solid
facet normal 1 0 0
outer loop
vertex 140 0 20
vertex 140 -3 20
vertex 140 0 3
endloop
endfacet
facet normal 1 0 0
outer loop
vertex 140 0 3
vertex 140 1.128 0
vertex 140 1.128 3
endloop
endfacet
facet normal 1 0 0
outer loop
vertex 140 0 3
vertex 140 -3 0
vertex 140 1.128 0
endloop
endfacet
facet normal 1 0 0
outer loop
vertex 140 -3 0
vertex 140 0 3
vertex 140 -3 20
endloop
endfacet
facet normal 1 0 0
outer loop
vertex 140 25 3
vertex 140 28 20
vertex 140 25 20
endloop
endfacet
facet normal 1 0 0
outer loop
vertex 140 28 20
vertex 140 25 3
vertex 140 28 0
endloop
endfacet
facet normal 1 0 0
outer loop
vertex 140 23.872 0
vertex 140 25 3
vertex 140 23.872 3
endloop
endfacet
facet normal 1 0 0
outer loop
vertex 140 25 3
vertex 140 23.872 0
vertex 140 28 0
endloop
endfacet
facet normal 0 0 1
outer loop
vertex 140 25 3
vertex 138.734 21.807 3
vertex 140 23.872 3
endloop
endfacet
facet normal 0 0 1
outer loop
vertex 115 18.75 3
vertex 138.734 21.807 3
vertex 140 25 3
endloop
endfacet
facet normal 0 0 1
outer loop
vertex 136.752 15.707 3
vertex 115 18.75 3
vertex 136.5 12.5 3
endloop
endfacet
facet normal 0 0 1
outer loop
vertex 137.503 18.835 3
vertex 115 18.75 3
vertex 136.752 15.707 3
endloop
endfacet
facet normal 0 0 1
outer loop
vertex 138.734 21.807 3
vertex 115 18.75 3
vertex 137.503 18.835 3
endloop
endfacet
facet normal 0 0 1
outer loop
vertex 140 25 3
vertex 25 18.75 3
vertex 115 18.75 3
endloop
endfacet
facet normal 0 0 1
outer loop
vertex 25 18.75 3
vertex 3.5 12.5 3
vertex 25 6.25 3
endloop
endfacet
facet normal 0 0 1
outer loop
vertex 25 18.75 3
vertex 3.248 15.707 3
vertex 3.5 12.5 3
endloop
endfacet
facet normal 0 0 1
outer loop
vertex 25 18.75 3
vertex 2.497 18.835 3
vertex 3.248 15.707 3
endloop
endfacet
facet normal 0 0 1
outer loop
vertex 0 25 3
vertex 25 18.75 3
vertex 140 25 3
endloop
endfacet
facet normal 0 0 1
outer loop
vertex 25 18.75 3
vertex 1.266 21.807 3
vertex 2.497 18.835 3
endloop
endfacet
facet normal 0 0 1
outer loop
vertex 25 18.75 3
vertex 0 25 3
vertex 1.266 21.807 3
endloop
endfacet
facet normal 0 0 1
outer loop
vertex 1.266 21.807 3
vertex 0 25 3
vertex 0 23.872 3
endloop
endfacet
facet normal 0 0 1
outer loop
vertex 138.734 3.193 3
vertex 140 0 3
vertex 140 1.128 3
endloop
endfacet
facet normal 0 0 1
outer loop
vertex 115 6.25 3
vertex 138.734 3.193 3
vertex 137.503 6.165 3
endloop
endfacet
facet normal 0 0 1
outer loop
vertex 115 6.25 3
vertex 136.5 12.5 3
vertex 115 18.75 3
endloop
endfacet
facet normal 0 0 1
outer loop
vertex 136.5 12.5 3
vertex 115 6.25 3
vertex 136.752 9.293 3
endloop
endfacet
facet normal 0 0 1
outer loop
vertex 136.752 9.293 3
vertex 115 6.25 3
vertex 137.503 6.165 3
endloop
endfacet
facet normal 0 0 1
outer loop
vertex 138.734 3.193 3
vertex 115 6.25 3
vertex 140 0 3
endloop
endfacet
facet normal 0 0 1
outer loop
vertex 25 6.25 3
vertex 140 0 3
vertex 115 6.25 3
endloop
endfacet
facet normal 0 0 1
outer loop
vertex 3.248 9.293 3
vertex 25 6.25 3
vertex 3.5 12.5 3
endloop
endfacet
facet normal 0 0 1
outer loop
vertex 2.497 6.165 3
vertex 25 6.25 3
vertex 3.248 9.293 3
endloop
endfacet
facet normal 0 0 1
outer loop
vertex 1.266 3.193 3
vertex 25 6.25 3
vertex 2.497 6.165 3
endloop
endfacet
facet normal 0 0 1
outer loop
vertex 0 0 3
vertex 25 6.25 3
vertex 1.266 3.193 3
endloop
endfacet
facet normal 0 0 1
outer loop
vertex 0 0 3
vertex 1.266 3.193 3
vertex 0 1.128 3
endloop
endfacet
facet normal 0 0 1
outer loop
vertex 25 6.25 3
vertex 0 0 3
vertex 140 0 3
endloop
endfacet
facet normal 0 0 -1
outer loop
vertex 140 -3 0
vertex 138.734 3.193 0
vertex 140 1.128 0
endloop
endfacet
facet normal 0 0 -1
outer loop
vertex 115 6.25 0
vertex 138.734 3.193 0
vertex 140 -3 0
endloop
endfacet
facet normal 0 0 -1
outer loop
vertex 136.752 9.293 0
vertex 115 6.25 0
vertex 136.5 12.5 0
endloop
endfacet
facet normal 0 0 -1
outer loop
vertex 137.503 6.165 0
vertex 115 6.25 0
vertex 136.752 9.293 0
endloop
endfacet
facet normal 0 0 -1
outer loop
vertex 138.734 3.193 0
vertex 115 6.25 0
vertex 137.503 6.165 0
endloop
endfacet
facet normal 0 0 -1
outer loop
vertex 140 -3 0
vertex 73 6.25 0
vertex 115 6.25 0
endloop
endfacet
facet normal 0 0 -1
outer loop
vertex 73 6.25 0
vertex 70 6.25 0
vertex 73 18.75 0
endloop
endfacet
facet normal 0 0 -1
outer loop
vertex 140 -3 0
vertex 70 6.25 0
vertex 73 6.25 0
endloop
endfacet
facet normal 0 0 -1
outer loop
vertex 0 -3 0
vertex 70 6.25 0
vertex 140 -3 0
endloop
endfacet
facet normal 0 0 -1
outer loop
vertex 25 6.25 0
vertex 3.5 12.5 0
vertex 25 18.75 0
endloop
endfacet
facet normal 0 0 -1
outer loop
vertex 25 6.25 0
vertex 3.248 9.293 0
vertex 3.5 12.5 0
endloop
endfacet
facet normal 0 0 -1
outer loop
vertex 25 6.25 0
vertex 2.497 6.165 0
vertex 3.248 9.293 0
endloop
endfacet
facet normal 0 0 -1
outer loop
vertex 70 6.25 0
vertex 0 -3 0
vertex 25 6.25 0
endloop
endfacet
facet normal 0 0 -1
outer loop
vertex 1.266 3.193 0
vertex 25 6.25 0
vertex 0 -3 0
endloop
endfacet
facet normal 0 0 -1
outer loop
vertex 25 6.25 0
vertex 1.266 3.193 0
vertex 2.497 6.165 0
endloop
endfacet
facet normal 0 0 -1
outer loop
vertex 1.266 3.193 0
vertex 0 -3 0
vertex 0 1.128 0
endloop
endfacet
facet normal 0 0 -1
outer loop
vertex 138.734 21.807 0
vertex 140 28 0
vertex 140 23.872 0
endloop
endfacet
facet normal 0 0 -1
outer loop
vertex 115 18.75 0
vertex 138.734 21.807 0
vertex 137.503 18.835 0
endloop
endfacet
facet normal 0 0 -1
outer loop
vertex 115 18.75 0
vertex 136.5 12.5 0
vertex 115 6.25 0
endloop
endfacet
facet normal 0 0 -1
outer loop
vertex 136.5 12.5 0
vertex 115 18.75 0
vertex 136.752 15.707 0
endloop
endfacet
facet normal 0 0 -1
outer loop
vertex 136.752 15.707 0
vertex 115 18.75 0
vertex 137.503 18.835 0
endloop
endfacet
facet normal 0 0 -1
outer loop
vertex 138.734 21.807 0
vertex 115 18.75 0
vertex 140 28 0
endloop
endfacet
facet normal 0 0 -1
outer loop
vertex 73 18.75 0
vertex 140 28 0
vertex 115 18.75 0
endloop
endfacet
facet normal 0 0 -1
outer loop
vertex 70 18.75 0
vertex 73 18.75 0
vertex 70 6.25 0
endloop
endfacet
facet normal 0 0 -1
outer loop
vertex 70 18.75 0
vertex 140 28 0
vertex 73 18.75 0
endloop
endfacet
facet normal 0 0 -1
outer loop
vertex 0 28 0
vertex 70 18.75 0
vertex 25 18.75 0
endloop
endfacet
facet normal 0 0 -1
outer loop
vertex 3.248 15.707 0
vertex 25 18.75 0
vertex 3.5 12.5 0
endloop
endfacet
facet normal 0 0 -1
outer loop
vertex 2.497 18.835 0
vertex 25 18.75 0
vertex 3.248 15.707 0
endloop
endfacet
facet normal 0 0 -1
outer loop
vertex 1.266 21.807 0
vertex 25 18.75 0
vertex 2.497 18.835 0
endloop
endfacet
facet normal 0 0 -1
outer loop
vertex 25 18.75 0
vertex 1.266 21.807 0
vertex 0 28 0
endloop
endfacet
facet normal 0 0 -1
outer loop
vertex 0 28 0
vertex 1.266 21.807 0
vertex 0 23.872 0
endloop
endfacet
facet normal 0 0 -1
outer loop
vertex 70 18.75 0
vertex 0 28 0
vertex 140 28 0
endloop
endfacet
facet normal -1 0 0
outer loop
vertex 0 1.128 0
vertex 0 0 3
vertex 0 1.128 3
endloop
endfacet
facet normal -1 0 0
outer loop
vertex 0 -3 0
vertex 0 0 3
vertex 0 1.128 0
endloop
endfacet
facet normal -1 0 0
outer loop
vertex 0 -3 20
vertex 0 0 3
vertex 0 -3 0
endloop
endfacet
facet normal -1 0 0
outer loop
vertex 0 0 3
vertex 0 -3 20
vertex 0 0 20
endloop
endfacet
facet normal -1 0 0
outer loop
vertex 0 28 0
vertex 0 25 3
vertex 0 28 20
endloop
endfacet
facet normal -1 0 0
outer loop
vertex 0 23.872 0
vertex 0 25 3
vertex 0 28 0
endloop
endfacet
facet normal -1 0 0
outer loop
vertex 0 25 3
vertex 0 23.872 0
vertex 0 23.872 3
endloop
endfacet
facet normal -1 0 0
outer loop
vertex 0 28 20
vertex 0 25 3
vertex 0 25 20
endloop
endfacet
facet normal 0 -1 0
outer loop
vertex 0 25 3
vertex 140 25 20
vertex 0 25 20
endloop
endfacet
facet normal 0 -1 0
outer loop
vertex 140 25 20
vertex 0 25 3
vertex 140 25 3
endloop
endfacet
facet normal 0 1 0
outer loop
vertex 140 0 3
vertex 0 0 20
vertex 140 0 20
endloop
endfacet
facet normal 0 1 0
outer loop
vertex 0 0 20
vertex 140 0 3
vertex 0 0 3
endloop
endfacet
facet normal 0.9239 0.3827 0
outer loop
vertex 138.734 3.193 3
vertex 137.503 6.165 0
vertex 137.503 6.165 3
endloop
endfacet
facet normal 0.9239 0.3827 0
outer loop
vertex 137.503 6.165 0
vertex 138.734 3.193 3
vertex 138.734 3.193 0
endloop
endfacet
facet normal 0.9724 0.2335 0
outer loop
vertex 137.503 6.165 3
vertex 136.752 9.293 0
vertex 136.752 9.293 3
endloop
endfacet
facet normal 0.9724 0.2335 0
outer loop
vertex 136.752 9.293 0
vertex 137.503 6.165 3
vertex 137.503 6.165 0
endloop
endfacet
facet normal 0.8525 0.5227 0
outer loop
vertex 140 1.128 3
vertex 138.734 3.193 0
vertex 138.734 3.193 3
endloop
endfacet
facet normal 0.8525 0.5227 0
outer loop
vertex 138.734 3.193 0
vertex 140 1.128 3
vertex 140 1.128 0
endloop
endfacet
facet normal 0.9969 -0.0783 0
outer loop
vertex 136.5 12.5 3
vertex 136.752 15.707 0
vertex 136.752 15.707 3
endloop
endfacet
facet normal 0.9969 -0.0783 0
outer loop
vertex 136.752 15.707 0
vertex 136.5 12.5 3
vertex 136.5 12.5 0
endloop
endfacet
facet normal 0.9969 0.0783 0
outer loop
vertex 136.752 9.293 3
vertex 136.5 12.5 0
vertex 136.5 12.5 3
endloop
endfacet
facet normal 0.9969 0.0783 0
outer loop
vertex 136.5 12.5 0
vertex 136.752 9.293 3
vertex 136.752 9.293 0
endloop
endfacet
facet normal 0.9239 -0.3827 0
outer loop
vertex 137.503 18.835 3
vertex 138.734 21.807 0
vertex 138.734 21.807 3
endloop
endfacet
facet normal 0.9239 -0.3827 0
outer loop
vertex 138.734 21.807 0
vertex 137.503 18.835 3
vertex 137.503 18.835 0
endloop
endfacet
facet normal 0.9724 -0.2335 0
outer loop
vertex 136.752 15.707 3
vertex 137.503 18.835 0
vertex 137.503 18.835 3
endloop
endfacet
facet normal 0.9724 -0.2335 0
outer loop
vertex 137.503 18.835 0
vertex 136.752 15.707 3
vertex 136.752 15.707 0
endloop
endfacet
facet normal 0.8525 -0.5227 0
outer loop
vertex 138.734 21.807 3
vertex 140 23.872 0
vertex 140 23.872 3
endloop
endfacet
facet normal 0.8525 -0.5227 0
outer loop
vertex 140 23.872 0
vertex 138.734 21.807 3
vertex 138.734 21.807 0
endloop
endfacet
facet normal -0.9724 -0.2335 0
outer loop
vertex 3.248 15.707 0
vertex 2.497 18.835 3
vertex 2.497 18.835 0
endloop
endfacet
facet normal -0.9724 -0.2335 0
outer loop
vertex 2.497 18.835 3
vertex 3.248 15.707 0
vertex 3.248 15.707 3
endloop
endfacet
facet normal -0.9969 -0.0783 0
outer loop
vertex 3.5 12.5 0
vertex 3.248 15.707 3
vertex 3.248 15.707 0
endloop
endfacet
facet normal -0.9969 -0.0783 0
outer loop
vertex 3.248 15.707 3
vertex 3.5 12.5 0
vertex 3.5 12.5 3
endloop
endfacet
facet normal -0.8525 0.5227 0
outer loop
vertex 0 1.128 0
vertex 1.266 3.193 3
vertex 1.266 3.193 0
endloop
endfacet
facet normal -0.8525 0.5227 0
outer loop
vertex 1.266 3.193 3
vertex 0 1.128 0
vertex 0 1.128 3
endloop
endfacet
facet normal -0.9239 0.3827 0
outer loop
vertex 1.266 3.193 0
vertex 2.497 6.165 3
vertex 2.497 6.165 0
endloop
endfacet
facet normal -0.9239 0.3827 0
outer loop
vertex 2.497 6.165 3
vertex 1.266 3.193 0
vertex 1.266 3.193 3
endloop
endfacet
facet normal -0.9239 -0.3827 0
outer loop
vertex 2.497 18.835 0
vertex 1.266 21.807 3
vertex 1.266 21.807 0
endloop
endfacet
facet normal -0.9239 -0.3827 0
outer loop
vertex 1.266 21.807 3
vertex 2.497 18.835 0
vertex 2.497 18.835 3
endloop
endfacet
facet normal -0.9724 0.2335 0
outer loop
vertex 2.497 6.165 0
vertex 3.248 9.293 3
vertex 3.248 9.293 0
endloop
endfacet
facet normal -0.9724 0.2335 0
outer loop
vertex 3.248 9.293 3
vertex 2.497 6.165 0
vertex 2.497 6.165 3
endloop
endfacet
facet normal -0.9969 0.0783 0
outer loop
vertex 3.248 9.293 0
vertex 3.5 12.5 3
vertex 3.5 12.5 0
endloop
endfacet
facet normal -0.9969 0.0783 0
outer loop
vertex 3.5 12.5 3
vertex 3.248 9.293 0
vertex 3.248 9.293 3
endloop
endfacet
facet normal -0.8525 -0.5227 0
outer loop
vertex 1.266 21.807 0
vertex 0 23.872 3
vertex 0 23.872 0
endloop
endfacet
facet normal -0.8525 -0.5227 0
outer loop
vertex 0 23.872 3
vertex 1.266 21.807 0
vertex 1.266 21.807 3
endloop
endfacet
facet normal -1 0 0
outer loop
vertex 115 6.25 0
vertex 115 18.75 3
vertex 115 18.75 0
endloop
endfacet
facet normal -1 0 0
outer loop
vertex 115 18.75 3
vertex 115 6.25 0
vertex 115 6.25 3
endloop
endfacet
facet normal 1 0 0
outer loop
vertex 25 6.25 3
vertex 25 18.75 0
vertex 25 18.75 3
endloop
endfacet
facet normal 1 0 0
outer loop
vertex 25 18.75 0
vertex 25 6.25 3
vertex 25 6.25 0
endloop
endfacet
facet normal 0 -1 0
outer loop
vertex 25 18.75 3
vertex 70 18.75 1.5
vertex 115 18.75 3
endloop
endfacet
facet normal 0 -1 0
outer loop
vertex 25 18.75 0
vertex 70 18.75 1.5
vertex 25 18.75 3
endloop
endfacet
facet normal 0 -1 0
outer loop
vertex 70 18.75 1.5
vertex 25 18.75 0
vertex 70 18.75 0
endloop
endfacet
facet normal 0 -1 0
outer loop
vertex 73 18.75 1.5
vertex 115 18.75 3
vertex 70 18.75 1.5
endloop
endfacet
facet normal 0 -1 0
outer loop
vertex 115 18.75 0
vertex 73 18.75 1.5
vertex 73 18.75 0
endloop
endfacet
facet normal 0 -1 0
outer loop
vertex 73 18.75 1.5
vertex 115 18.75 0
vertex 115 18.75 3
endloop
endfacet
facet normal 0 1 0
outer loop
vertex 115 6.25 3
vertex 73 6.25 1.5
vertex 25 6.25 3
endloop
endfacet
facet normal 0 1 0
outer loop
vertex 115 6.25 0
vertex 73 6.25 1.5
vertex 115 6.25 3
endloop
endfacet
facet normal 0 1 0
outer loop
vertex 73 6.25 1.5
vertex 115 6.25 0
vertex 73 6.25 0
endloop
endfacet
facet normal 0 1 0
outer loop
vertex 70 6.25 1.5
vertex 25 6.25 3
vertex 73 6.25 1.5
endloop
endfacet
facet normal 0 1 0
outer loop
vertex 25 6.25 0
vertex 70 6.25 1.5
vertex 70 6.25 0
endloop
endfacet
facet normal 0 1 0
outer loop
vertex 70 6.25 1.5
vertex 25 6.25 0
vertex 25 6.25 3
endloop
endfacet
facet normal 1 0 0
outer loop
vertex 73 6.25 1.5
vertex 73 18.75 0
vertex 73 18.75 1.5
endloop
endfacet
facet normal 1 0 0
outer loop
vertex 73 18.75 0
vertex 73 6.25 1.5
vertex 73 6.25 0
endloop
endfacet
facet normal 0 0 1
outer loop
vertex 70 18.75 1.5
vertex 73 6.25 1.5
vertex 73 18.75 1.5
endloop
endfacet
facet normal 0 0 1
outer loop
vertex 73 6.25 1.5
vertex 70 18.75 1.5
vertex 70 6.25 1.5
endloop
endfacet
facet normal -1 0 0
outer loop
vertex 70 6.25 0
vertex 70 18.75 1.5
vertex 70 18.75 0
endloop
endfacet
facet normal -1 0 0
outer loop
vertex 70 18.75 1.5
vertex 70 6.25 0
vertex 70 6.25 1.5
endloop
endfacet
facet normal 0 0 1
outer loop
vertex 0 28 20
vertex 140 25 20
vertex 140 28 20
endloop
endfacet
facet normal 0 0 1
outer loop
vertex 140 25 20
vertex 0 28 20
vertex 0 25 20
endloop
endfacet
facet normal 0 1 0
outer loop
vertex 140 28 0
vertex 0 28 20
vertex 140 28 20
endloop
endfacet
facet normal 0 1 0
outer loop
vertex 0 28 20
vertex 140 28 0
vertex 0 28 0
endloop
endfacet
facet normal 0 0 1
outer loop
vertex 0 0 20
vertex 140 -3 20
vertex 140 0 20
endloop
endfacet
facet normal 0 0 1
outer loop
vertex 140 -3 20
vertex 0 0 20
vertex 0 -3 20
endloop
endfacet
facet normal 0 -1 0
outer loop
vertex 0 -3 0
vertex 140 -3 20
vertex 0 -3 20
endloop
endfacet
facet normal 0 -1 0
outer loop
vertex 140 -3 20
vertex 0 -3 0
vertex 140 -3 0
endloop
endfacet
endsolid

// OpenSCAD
/*
 * This program is free software: you can redistribute it and/or modify
 * it under the terms of the GNU General Public License as published by
 * the Free Software Foundation, version 3.
 *
 * This program is distributed in the hope that it will be useful, but
 * WITHOUT ANY WARRANTY; without even the implied warranty of
 * MERCHANTABILITY or FITNESS FOR A PARTICULAR PURPOSE. See the GNU
 * General Public License for more details.
 *
 * You should have received a copy of the GNU General Public License
 * along with this program. If not, see <http://www.gnu.org/licenses/>.
 */

// Main parameters
// Total length of spool from end to end
totalLength = 140;
// Inner width of spool (should be bigger than the width of your bobber)
innerWidth = 25;
// Thickness of walls
wallThickness = 3;
// The height of the walls (+ thickness of walls)
wallHeight = 17 + wallThickness;

// End circles
// How "deep" into the main part should the circles be moved
circleDepth = 17;
// Normally 0, but if the above circleDepth value is high you can add here to get smoother circle
circleRadiusExtra = 8;

// Inner rectangular hole
// Length of the inner hole
holeLength = totalLength - 50;
// Width of the inner hole
holeWidth = innerWidth/2;

// Smoothness (of circles).
// Can be put lower when testing for better performance,
// and higher for final export
$fn = 40;

// Uncomment for splitting in half if your build plate is too small
// You need Johannes' OpenSCAD library in your path (https://github.com/jernst/josl)
/*
use <josl/cuts/puzzle.scad>

Puzzle( y=[3.5,16.5]) {
    translate( [ -totalLength/2, 0, 0 ] ) {
        wholeSpool();
   }
}

*/

wholeSpool();



module fullSpool () {
    color("blue")
    cube([totalLength,innerWidth,wallThickness]);
}

module endCircle (){
    color("red")
    linear_extrude(height = wallThickness+5, center = true, convexity = 10, twist = 0)
    circle(r = (innerWidth/2)+circleRadiusExtra);
}

module sidePanel (){
    color("green")
    cube([totalLength,wallThickness,wallHeight]);

}

module middlePin (){
    color("orange")
    cube([3,innerWidth,wallThickness/2]);
}

module innerHole (){
    color("green")
    cube([holeLength,holeWidth,50]);
}

module wholeSpool() {
    difference() {
    {
        {
            difference()
            {
            fullSpool();
            translate([totalLength + circleDepth , innerWidth/2, 0]) endCircle();
            translate([-circleDepth, innerWidth/2, 0]) endCircle();
            }

        }
    }
translate([(totalLength-holeLength)/2,holeWidth/2 , -20]) innerHole();
}

translate([totalLength/2, 0  , 0]) middlePin();

translate([0, innerWidth, 0]) sidePanel();
translate([0, -wallThickness, 0]) sidePanel();
}
